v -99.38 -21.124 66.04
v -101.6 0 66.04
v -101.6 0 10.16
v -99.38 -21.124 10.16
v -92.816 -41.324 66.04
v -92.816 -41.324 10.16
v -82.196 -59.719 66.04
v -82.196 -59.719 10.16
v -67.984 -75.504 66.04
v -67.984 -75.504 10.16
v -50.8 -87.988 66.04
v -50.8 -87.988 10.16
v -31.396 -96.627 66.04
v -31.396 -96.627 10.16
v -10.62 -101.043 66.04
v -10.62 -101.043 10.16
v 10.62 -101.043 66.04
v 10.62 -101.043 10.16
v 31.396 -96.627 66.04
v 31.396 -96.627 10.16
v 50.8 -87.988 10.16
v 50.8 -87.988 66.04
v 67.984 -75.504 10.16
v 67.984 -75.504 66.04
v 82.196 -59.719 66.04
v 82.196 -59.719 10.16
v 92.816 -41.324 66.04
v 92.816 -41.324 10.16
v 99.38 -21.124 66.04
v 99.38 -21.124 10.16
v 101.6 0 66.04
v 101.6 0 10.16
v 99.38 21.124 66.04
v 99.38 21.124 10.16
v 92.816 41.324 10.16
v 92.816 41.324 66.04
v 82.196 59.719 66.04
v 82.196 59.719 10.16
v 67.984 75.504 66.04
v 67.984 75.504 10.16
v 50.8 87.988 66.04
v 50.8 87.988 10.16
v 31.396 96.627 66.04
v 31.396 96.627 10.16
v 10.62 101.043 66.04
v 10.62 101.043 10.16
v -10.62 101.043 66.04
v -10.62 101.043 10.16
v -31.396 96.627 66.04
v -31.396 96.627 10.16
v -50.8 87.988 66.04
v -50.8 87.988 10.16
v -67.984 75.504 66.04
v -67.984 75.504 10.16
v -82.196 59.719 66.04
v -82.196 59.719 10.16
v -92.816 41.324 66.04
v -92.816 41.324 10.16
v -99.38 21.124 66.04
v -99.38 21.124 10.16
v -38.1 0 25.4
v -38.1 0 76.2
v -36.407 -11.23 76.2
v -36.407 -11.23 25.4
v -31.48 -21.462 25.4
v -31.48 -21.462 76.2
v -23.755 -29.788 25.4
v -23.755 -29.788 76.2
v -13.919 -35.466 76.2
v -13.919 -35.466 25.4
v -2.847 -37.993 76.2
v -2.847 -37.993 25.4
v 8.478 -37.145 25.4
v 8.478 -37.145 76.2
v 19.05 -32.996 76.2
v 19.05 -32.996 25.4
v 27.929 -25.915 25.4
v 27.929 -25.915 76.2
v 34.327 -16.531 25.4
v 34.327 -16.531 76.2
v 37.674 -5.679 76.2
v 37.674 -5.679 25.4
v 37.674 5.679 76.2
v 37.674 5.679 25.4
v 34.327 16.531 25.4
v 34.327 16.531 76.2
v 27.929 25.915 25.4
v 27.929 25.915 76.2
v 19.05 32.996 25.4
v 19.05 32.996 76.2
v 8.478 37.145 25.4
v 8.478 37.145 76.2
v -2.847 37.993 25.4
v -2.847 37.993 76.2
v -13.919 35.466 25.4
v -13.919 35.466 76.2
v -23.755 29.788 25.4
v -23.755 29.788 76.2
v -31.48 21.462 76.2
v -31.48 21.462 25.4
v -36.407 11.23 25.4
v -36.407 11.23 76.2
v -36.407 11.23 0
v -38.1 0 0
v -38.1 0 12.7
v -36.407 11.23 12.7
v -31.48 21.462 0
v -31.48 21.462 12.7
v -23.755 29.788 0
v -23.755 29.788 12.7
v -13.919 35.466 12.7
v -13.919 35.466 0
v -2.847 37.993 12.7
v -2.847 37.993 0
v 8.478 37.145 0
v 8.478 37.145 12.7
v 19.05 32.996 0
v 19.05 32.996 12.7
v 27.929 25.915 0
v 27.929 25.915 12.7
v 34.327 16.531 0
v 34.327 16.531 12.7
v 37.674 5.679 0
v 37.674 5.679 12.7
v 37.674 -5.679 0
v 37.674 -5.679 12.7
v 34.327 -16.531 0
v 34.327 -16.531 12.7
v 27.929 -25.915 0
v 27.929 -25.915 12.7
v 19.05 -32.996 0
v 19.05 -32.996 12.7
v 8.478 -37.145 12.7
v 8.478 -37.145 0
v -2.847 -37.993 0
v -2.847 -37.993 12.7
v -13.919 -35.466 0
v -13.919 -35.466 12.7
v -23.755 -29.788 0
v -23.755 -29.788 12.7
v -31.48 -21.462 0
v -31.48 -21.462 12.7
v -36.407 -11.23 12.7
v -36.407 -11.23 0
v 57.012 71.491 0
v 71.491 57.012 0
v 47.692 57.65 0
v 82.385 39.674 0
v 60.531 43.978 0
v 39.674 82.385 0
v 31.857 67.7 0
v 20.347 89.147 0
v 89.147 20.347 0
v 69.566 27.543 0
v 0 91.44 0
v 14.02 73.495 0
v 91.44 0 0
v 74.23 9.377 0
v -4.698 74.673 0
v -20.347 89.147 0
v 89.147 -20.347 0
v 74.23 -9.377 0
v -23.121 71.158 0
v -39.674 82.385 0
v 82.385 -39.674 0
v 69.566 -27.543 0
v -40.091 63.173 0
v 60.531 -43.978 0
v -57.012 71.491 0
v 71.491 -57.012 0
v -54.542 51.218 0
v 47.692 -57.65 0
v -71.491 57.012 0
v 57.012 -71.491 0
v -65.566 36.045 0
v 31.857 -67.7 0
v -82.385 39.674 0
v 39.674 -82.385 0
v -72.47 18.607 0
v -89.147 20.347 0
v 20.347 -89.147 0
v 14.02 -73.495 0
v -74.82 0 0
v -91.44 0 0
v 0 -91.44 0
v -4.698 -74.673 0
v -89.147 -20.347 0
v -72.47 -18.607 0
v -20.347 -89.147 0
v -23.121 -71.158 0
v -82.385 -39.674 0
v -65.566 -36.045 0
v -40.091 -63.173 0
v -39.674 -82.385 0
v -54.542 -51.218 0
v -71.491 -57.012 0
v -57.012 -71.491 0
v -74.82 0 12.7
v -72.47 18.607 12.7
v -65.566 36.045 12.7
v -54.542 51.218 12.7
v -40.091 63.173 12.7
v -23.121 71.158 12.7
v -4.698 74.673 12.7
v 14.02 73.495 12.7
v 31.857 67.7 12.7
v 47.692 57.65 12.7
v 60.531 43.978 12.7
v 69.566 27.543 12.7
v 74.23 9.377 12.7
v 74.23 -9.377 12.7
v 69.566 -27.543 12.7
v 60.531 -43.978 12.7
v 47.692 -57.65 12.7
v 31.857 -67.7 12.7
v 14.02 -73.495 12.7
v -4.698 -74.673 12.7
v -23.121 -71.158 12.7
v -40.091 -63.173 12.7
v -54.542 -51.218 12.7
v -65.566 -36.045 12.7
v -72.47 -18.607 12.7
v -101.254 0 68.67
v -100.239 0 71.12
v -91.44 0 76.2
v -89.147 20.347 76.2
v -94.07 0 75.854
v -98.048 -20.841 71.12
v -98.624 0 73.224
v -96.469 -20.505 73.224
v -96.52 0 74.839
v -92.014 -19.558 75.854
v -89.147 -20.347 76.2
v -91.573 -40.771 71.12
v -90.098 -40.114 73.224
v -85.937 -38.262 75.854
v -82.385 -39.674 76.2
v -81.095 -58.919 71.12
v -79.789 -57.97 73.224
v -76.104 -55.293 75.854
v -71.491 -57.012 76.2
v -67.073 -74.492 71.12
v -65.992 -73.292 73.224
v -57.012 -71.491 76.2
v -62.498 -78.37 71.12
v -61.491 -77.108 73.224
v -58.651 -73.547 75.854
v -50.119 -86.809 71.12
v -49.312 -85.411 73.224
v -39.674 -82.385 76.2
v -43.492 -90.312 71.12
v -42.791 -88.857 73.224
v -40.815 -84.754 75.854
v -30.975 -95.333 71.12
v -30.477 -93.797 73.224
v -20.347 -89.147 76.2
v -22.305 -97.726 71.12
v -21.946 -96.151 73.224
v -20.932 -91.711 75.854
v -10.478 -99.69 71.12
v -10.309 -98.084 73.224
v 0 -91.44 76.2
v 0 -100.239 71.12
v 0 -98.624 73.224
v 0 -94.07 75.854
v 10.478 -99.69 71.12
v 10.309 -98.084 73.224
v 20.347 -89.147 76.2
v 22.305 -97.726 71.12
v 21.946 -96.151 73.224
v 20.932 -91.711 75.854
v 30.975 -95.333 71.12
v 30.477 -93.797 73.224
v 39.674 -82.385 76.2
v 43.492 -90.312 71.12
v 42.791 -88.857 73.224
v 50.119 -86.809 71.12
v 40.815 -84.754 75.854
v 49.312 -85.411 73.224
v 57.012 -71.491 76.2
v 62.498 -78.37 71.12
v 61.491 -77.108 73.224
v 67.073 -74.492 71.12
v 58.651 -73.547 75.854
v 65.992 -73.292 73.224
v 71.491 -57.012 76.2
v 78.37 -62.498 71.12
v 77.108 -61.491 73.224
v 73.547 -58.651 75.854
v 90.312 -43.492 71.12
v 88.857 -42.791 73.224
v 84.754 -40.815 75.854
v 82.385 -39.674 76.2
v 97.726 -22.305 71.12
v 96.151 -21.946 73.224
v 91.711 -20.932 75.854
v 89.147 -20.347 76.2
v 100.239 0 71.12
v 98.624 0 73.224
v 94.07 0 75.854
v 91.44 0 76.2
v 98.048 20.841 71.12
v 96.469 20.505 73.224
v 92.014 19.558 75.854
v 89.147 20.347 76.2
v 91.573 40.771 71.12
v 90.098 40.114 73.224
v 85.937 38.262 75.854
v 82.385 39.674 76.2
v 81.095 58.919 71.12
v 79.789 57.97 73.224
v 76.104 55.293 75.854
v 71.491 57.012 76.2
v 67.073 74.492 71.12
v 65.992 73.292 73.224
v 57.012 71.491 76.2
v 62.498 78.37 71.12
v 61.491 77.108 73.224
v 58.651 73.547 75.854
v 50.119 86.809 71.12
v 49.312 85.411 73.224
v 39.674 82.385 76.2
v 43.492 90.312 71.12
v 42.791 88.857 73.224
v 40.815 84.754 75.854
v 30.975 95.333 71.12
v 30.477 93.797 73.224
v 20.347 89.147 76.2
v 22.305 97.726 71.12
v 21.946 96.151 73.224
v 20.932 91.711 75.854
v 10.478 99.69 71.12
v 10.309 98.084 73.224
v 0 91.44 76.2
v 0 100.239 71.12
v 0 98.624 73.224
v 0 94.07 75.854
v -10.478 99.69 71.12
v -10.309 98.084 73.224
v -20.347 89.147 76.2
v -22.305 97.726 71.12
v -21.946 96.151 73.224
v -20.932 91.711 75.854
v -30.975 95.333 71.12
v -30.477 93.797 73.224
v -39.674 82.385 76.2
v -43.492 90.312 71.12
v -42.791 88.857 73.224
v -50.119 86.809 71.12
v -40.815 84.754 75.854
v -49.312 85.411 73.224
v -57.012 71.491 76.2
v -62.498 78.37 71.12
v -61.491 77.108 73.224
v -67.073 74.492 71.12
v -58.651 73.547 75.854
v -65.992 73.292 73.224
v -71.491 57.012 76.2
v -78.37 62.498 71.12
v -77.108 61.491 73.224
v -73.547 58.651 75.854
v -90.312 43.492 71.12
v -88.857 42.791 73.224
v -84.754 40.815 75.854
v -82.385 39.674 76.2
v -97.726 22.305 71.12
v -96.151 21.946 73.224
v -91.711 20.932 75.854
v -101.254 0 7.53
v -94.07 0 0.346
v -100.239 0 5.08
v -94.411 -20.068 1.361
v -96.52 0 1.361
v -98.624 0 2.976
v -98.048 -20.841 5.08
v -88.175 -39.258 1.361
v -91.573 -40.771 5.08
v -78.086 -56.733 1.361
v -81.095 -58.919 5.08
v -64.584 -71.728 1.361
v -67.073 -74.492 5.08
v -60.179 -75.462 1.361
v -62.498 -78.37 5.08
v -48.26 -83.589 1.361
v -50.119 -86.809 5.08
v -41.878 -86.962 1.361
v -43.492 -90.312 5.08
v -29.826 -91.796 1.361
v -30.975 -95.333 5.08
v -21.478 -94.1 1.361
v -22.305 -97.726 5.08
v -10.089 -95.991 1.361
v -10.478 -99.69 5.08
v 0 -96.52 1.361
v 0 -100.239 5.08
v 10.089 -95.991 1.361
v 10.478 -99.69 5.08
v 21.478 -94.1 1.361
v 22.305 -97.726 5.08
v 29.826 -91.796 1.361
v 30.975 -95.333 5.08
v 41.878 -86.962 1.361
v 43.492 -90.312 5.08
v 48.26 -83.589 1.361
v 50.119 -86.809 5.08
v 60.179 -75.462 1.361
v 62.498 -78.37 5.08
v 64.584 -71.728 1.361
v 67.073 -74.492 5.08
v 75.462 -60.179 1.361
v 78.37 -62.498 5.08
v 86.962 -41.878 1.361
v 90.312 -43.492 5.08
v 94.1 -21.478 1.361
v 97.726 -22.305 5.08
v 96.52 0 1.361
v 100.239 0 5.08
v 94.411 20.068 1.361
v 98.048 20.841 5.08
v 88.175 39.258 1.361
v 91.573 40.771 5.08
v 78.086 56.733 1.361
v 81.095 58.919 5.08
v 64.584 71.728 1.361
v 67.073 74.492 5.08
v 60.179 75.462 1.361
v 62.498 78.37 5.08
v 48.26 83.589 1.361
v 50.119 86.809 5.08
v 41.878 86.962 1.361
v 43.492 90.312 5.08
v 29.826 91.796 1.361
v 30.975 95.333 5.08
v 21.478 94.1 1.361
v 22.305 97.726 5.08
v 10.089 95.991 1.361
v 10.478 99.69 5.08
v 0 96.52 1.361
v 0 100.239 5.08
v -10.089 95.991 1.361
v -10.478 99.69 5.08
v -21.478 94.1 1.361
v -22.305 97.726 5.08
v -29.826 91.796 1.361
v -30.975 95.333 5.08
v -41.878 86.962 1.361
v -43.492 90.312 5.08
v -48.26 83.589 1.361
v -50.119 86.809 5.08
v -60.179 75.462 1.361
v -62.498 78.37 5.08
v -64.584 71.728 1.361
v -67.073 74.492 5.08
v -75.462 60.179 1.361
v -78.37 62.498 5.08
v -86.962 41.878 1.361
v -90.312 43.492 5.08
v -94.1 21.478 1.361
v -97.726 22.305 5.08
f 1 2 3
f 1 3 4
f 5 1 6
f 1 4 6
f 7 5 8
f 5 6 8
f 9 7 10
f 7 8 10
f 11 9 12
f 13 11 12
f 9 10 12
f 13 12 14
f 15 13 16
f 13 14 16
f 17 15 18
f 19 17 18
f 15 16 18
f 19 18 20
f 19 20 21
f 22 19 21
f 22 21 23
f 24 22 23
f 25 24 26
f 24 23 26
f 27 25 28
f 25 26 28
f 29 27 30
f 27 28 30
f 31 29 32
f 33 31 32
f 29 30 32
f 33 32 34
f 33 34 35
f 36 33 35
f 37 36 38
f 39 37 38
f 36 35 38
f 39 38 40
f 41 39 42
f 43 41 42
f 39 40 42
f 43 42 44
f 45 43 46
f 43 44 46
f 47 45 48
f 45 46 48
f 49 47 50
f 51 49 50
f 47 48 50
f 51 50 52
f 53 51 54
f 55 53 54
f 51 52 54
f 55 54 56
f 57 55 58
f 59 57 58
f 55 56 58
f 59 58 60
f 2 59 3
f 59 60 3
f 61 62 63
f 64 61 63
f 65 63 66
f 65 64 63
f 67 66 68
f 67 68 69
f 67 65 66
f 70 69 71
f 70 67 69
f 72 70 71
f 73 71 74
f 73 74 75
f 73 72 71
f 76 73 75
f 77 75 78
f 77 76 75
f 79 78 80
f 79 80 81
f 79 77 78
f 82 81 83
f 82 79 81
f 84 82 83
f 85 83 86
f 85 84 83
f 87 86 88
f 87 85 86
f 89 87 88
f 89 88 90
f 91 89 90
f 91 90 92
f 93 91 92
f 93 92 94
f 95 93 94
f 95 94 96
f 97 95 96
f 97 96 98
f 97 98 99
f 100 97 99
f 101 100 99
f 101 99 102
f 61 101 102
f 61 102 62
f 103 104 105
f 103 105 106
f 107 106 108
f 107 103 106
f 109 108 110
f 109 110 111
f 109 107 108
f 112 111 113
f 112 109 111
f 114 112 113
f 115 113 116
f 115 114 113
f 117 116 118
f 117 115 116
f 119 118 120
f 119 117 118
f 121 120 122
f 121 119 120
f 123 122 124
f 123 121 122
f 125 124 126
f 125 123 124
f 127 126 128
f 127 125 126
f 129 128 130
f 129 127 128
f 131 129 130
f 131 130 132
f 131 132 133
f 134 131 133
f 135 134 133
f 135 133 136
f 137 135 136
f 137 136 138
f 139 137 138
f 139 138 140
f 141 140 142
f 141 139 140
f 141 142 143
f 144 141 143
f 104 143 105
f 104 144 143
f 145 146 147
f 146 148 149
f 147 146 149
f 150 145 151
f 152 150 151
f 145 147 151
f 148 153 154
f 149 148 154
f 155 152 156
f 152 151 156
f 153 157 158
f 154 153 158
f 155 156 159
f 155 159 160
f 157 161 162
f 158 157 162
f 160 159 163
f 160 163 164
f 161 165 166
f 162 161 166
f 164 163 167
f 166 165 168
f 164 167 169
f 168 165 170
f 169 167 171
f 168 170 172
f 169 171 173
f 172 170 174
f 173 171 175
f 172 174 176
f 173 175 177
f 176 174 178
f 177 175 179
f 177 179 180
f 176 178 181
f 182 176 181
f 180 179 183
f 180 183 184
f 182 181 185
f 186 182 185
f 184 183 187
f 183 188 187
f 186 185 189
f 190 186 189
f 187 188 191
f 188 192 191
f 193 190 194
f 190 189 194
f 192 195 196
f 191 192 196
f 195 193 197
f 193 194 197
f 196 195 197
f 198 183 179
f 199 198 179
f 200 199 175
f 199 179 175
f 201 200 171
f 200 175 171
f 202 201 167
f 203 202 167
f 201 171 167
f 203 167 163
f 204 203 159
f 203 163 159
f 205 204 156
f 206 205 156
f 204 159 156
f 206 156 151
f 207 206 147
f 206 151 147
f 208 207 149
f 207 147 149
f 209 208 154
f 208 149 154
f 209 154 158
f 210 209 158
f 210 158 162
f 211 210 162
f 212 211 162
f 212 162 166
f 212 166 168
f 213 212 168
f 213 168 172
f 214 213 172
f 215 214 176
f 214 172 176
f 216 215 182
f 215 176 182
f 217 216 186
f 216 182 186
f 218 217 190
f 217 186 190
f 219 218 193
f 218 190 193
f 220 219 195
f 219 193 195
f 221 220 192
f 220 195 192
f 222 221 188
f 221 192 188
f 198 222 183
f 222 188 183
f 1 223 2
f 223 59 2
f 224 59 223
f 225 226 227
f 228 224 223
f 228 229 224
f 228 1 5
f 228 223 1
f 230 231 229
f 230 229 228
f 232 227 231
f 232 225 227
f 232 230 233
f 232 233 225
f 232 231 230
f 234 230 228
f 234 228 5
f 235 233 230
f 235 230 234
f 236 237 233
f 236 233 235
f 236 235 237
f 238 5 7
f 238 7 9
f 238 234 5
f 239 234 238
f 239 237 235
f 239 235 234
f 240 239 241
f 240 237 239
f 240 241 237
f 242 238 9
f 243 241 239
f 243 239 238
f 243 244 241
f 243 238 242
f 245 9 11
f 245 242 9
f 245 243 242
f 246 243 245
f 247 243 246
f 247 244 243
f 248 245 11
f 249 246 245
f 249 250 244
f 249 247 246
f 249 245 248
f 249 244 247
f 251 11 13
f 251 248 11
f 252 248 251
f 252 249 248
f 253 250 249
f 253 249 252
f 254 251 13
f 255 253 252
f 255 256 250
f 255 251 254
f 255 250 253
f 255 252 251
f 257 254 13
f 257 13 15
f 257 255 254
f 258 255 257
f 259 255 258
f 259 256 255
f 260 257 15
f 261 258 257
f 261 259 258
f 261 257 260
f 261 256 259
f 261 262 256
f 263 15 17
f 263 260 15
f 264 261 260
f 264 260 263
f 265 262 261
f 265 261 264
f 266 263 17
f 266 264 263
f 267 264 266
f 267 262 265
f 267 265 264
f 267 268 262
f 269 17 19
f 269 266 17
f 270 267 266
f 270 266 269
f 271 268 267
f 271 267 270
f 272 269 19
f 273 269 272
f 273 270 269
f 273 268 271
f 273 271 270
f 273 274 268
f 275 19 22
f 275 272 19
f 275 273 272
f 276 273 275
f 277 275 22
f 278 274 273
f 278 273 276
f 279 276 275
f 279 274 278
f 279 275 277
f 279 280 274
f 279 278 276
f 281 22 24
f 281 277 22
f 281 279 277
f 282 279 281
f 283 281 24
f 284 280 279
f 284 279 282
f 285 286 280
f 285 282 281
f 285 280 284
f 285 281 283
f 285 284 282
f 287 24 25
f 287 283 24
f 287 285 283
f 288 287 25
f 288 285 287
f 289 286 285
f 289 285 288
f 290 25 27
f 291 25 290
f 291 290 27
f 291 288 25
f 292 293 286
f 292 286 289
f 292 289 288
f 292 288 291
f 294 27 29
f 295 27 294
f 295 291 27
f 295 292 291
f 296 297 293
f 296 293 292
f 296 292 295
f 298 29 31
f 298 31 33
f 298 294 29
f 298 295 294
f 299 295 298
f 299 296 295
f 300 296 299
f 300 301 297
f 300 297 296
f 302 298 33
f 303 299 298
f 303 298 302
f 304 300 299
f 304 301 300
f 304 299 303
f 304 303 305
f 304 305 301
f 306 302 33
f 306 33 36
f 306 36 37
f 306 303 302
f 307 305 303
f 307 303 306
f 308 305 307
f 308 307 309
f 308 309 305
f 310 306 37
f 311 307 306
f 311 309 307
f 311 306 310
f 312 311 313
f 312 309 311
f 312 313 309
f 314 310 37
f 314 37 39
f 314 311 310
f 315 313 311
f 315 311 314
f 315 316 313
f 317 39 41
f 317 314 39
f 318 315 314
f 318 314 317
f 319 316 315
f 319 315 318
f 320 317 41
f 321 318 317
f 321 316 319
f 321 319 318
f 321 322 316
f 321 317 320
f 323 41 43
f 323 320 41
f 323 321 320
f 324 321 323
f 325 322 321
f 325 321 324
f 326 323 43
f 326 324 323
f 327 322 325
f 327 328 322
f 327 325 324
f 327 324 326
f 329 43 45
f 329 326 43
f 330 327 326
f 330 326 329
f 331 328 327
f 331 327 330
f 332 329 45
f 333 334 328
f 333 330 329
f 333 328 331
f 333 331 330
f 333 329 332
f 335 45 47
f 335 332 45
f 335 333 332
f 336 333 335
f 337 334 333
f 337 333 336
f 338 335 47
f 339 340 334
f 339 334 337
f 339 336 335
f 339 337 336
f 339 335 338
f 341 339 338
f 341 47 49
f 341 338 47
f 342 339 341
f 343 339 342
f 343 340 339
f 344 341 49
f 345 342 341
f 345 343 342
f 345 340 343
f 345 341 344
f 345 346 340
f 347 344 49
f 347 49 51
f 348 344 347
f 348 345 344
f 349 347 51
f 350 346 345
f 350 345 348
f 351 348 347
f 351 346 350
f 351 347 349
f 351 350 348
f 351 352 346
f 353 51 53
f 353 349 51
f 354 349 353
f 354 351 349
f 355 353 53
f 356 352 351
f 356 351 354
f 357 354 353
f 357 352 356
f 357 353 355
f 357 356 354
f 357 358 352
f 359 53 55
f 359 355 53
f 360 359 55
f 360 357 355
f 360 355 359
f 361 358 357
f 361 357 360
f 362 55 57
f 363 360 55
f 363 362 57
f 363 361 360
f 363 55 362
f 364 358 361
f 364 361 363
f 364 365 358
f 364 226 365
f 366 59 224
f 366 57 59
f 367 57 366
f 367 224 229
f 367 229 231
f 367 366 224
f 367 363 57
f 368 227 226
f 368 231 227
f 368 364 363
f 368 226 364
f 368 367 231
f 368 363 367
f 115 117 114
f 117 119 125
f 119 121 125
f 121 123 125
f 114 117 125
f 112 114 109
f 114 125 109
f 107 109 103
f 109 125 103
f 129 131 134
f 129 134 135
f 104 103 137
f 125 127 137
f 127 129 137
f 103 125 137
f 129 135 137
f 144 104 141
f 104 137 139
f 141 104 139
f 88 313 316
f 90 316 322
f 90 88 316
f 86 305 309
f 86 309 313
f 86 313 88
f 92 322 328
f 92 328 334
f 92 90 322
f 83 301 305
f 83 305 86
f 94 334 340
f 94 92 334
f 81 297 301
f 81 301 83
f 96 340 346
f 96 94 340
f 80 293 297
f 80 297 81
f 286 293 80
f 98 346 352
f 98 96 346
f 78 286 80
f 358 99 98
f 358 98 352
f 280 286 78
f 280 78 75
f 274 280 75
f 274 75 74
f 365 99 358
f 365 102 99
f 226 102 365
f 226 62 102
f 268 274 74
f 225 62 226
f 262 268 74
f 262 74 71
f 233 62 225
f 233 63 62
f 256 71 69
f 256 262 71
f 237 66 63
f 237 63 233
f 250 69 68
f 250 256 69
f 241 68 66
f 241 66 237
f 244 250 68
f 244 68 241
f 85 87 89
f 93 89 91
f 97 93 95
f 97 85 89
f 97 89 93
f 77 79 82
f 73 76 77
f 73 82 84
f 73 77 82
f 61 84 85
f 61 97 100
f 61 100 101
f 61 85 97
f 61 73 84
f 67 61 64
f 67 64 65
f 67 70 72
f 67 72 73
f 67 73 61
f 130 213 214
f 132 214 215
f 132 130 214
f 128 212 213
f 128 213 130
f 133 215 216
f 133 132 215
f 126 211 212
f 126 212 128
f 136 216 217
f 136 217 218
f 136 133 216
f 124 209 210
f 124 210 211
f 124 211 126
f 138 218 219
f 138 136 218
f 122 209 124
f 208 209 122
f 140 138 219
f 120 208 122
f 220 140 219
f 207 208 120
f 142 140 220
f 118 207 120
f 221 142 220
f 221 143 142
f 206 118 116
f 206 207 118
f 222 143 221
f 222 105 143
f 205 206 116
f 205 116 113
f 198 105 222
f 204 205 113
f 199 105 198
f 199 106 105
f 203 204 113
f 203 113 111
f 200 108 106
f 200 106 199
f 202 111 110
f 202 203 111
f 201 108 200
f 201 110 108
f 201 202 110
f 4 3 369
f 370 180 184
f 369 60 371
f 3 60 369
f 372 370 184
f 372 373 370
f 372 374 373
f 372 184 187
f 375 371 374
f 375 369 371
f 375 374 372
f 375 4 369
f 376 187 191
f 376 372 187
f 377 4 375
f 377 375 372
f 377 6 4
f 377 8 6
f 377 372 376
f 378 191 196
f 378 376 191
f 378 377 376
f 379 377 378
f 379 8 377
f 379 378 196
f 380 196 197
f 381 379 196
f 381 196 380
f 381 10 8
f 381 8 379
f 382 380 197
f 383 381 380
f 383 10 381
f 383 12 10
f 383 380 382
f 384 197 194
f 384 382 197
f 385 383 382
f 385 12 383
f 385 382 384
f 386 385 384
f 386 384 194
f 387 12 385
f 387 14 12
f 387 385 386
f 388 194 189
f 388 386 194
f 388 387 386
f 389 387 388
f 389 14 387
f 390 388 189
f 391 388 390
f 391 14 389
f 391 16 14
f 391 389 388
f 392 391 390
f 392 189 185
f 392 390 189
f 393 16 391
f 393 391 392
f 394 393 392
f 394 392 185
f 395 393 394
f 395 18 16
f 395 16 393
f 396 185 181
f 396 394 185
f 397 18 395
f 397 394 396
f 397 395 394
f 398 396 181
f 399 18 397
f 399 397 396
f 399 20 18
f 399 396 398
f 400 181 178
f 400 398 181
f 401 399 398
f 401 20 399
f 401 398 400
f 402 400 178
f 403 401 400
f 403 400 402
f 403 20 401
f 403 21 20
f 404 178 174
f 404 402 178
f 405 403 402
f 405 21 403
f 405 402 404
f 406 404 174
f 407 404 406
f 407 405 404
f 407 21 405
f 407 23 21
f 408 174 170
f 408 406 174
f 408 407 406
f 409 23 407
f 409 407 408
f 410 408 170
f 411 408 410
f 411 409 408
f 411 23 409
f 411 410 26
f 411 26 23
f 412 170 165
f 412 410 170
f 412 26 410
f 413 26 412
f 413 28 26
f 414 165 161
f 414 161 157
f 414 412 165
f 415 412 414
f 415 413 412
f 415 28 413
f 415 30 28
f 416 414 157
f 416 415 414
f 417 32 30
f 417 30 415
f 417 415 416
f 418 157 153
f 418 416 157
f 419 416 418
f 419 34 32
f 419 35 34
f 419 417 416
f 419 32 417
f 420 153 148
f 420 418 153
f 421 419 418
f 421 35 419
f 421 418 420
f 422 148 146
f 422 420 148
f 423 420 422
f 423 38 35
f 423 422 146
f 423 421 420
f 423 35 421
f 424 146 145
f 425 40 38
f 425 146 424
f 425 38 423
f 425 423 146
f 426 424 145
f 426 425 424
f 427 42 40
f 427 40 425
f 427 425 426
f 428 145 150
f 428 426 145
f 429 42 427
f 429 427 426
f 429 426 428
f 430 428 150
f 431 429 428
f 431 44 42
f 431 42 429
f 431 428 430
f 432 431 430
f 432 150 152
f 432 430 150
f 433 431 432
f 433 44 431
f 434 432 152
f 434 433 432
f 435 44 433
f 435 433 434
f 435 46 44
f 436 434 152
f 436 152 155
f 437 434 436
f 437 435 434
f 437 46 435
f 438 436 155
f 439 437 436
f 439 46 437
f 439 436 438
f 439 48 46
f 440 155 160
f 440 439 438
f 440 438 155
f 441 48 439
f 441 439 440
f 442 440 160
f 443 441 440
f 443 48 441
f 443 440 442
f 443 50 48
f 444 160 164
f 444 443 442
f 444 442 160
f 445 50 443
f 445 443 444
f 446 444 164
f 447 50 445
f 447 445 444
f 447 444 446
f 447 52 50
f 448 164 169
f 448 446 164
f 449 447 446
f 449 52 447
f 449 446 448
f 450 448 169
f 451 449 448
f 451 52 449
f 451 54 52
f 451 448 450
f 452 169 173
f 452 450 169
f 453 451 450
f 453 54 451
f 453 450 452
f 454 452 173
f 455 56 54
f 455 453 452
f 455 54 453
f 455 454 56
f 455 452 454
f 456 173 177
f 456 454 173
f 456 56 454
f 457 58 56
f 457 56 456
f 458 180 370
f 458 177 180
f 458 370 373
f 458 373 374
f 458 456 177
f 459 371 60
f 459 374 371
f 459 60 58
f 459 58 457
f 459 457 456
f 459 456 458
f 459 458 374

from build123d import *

# Parameters (mm, degrees)
SKETCH1_R           = 101.6
SKETCH1_R_2         = 38.1
BOSS_EXTRUDE7_DEPTH = 76.2
SKETCH1_11_R        = 38.1
BOSS_EXTRUDE9_DEPTH = 25.4
FILLET1_R           = 10.16
SKETCH2_R           = 74.820465974
SKETCH2_R_2         = 38.1
CUT_EXTRUDE1_DEPTH  = 12.7


with BuildPart() as part:
    # Sketch1 → Boss-Extrude7 (new body)
    with BuildSketch(Plane.XY):
        Circle(SKETCH1_R)
        Circle(SKETCH1_R_2, mode=Mode.SUBTRACT)
    extrude(amount=BOSS_EXTRUDE7_DEPTH)

    # Sketch1<11> → Boss-Extrude9 (add)
    with BuildSketch(Plane.XY):
        Circle(SKETCH1_11_R)
    extrude(amount=BOSS_EXTRUDE9_DEPTH)

    # Fillet1
    fillet1_edges = [part.edges().sort_by_distance(p)[0] for p in [
        (-101.6, 0, 76.2),
        (-101.6, 0, 0),
    ]]
    fillet(fillet1_edges, radius=FILLET1_R)

    # Sketch2 → Cut-Extrude1 (cut)
    with BuildSketch(Plane(origin=(0, 0, 0), x_dir=(-1, 0, 0), z_dir=(0, 0, -1))):
        Circle(SKETCH2_R)
        Circle(SKETCH2_R_2, mode=Mode.SUBTRACT)
    extrude(amount=-CUT_EXTRUDE1_DEPTH, mode=Mode.SUBTRACT)


solid = part.part
